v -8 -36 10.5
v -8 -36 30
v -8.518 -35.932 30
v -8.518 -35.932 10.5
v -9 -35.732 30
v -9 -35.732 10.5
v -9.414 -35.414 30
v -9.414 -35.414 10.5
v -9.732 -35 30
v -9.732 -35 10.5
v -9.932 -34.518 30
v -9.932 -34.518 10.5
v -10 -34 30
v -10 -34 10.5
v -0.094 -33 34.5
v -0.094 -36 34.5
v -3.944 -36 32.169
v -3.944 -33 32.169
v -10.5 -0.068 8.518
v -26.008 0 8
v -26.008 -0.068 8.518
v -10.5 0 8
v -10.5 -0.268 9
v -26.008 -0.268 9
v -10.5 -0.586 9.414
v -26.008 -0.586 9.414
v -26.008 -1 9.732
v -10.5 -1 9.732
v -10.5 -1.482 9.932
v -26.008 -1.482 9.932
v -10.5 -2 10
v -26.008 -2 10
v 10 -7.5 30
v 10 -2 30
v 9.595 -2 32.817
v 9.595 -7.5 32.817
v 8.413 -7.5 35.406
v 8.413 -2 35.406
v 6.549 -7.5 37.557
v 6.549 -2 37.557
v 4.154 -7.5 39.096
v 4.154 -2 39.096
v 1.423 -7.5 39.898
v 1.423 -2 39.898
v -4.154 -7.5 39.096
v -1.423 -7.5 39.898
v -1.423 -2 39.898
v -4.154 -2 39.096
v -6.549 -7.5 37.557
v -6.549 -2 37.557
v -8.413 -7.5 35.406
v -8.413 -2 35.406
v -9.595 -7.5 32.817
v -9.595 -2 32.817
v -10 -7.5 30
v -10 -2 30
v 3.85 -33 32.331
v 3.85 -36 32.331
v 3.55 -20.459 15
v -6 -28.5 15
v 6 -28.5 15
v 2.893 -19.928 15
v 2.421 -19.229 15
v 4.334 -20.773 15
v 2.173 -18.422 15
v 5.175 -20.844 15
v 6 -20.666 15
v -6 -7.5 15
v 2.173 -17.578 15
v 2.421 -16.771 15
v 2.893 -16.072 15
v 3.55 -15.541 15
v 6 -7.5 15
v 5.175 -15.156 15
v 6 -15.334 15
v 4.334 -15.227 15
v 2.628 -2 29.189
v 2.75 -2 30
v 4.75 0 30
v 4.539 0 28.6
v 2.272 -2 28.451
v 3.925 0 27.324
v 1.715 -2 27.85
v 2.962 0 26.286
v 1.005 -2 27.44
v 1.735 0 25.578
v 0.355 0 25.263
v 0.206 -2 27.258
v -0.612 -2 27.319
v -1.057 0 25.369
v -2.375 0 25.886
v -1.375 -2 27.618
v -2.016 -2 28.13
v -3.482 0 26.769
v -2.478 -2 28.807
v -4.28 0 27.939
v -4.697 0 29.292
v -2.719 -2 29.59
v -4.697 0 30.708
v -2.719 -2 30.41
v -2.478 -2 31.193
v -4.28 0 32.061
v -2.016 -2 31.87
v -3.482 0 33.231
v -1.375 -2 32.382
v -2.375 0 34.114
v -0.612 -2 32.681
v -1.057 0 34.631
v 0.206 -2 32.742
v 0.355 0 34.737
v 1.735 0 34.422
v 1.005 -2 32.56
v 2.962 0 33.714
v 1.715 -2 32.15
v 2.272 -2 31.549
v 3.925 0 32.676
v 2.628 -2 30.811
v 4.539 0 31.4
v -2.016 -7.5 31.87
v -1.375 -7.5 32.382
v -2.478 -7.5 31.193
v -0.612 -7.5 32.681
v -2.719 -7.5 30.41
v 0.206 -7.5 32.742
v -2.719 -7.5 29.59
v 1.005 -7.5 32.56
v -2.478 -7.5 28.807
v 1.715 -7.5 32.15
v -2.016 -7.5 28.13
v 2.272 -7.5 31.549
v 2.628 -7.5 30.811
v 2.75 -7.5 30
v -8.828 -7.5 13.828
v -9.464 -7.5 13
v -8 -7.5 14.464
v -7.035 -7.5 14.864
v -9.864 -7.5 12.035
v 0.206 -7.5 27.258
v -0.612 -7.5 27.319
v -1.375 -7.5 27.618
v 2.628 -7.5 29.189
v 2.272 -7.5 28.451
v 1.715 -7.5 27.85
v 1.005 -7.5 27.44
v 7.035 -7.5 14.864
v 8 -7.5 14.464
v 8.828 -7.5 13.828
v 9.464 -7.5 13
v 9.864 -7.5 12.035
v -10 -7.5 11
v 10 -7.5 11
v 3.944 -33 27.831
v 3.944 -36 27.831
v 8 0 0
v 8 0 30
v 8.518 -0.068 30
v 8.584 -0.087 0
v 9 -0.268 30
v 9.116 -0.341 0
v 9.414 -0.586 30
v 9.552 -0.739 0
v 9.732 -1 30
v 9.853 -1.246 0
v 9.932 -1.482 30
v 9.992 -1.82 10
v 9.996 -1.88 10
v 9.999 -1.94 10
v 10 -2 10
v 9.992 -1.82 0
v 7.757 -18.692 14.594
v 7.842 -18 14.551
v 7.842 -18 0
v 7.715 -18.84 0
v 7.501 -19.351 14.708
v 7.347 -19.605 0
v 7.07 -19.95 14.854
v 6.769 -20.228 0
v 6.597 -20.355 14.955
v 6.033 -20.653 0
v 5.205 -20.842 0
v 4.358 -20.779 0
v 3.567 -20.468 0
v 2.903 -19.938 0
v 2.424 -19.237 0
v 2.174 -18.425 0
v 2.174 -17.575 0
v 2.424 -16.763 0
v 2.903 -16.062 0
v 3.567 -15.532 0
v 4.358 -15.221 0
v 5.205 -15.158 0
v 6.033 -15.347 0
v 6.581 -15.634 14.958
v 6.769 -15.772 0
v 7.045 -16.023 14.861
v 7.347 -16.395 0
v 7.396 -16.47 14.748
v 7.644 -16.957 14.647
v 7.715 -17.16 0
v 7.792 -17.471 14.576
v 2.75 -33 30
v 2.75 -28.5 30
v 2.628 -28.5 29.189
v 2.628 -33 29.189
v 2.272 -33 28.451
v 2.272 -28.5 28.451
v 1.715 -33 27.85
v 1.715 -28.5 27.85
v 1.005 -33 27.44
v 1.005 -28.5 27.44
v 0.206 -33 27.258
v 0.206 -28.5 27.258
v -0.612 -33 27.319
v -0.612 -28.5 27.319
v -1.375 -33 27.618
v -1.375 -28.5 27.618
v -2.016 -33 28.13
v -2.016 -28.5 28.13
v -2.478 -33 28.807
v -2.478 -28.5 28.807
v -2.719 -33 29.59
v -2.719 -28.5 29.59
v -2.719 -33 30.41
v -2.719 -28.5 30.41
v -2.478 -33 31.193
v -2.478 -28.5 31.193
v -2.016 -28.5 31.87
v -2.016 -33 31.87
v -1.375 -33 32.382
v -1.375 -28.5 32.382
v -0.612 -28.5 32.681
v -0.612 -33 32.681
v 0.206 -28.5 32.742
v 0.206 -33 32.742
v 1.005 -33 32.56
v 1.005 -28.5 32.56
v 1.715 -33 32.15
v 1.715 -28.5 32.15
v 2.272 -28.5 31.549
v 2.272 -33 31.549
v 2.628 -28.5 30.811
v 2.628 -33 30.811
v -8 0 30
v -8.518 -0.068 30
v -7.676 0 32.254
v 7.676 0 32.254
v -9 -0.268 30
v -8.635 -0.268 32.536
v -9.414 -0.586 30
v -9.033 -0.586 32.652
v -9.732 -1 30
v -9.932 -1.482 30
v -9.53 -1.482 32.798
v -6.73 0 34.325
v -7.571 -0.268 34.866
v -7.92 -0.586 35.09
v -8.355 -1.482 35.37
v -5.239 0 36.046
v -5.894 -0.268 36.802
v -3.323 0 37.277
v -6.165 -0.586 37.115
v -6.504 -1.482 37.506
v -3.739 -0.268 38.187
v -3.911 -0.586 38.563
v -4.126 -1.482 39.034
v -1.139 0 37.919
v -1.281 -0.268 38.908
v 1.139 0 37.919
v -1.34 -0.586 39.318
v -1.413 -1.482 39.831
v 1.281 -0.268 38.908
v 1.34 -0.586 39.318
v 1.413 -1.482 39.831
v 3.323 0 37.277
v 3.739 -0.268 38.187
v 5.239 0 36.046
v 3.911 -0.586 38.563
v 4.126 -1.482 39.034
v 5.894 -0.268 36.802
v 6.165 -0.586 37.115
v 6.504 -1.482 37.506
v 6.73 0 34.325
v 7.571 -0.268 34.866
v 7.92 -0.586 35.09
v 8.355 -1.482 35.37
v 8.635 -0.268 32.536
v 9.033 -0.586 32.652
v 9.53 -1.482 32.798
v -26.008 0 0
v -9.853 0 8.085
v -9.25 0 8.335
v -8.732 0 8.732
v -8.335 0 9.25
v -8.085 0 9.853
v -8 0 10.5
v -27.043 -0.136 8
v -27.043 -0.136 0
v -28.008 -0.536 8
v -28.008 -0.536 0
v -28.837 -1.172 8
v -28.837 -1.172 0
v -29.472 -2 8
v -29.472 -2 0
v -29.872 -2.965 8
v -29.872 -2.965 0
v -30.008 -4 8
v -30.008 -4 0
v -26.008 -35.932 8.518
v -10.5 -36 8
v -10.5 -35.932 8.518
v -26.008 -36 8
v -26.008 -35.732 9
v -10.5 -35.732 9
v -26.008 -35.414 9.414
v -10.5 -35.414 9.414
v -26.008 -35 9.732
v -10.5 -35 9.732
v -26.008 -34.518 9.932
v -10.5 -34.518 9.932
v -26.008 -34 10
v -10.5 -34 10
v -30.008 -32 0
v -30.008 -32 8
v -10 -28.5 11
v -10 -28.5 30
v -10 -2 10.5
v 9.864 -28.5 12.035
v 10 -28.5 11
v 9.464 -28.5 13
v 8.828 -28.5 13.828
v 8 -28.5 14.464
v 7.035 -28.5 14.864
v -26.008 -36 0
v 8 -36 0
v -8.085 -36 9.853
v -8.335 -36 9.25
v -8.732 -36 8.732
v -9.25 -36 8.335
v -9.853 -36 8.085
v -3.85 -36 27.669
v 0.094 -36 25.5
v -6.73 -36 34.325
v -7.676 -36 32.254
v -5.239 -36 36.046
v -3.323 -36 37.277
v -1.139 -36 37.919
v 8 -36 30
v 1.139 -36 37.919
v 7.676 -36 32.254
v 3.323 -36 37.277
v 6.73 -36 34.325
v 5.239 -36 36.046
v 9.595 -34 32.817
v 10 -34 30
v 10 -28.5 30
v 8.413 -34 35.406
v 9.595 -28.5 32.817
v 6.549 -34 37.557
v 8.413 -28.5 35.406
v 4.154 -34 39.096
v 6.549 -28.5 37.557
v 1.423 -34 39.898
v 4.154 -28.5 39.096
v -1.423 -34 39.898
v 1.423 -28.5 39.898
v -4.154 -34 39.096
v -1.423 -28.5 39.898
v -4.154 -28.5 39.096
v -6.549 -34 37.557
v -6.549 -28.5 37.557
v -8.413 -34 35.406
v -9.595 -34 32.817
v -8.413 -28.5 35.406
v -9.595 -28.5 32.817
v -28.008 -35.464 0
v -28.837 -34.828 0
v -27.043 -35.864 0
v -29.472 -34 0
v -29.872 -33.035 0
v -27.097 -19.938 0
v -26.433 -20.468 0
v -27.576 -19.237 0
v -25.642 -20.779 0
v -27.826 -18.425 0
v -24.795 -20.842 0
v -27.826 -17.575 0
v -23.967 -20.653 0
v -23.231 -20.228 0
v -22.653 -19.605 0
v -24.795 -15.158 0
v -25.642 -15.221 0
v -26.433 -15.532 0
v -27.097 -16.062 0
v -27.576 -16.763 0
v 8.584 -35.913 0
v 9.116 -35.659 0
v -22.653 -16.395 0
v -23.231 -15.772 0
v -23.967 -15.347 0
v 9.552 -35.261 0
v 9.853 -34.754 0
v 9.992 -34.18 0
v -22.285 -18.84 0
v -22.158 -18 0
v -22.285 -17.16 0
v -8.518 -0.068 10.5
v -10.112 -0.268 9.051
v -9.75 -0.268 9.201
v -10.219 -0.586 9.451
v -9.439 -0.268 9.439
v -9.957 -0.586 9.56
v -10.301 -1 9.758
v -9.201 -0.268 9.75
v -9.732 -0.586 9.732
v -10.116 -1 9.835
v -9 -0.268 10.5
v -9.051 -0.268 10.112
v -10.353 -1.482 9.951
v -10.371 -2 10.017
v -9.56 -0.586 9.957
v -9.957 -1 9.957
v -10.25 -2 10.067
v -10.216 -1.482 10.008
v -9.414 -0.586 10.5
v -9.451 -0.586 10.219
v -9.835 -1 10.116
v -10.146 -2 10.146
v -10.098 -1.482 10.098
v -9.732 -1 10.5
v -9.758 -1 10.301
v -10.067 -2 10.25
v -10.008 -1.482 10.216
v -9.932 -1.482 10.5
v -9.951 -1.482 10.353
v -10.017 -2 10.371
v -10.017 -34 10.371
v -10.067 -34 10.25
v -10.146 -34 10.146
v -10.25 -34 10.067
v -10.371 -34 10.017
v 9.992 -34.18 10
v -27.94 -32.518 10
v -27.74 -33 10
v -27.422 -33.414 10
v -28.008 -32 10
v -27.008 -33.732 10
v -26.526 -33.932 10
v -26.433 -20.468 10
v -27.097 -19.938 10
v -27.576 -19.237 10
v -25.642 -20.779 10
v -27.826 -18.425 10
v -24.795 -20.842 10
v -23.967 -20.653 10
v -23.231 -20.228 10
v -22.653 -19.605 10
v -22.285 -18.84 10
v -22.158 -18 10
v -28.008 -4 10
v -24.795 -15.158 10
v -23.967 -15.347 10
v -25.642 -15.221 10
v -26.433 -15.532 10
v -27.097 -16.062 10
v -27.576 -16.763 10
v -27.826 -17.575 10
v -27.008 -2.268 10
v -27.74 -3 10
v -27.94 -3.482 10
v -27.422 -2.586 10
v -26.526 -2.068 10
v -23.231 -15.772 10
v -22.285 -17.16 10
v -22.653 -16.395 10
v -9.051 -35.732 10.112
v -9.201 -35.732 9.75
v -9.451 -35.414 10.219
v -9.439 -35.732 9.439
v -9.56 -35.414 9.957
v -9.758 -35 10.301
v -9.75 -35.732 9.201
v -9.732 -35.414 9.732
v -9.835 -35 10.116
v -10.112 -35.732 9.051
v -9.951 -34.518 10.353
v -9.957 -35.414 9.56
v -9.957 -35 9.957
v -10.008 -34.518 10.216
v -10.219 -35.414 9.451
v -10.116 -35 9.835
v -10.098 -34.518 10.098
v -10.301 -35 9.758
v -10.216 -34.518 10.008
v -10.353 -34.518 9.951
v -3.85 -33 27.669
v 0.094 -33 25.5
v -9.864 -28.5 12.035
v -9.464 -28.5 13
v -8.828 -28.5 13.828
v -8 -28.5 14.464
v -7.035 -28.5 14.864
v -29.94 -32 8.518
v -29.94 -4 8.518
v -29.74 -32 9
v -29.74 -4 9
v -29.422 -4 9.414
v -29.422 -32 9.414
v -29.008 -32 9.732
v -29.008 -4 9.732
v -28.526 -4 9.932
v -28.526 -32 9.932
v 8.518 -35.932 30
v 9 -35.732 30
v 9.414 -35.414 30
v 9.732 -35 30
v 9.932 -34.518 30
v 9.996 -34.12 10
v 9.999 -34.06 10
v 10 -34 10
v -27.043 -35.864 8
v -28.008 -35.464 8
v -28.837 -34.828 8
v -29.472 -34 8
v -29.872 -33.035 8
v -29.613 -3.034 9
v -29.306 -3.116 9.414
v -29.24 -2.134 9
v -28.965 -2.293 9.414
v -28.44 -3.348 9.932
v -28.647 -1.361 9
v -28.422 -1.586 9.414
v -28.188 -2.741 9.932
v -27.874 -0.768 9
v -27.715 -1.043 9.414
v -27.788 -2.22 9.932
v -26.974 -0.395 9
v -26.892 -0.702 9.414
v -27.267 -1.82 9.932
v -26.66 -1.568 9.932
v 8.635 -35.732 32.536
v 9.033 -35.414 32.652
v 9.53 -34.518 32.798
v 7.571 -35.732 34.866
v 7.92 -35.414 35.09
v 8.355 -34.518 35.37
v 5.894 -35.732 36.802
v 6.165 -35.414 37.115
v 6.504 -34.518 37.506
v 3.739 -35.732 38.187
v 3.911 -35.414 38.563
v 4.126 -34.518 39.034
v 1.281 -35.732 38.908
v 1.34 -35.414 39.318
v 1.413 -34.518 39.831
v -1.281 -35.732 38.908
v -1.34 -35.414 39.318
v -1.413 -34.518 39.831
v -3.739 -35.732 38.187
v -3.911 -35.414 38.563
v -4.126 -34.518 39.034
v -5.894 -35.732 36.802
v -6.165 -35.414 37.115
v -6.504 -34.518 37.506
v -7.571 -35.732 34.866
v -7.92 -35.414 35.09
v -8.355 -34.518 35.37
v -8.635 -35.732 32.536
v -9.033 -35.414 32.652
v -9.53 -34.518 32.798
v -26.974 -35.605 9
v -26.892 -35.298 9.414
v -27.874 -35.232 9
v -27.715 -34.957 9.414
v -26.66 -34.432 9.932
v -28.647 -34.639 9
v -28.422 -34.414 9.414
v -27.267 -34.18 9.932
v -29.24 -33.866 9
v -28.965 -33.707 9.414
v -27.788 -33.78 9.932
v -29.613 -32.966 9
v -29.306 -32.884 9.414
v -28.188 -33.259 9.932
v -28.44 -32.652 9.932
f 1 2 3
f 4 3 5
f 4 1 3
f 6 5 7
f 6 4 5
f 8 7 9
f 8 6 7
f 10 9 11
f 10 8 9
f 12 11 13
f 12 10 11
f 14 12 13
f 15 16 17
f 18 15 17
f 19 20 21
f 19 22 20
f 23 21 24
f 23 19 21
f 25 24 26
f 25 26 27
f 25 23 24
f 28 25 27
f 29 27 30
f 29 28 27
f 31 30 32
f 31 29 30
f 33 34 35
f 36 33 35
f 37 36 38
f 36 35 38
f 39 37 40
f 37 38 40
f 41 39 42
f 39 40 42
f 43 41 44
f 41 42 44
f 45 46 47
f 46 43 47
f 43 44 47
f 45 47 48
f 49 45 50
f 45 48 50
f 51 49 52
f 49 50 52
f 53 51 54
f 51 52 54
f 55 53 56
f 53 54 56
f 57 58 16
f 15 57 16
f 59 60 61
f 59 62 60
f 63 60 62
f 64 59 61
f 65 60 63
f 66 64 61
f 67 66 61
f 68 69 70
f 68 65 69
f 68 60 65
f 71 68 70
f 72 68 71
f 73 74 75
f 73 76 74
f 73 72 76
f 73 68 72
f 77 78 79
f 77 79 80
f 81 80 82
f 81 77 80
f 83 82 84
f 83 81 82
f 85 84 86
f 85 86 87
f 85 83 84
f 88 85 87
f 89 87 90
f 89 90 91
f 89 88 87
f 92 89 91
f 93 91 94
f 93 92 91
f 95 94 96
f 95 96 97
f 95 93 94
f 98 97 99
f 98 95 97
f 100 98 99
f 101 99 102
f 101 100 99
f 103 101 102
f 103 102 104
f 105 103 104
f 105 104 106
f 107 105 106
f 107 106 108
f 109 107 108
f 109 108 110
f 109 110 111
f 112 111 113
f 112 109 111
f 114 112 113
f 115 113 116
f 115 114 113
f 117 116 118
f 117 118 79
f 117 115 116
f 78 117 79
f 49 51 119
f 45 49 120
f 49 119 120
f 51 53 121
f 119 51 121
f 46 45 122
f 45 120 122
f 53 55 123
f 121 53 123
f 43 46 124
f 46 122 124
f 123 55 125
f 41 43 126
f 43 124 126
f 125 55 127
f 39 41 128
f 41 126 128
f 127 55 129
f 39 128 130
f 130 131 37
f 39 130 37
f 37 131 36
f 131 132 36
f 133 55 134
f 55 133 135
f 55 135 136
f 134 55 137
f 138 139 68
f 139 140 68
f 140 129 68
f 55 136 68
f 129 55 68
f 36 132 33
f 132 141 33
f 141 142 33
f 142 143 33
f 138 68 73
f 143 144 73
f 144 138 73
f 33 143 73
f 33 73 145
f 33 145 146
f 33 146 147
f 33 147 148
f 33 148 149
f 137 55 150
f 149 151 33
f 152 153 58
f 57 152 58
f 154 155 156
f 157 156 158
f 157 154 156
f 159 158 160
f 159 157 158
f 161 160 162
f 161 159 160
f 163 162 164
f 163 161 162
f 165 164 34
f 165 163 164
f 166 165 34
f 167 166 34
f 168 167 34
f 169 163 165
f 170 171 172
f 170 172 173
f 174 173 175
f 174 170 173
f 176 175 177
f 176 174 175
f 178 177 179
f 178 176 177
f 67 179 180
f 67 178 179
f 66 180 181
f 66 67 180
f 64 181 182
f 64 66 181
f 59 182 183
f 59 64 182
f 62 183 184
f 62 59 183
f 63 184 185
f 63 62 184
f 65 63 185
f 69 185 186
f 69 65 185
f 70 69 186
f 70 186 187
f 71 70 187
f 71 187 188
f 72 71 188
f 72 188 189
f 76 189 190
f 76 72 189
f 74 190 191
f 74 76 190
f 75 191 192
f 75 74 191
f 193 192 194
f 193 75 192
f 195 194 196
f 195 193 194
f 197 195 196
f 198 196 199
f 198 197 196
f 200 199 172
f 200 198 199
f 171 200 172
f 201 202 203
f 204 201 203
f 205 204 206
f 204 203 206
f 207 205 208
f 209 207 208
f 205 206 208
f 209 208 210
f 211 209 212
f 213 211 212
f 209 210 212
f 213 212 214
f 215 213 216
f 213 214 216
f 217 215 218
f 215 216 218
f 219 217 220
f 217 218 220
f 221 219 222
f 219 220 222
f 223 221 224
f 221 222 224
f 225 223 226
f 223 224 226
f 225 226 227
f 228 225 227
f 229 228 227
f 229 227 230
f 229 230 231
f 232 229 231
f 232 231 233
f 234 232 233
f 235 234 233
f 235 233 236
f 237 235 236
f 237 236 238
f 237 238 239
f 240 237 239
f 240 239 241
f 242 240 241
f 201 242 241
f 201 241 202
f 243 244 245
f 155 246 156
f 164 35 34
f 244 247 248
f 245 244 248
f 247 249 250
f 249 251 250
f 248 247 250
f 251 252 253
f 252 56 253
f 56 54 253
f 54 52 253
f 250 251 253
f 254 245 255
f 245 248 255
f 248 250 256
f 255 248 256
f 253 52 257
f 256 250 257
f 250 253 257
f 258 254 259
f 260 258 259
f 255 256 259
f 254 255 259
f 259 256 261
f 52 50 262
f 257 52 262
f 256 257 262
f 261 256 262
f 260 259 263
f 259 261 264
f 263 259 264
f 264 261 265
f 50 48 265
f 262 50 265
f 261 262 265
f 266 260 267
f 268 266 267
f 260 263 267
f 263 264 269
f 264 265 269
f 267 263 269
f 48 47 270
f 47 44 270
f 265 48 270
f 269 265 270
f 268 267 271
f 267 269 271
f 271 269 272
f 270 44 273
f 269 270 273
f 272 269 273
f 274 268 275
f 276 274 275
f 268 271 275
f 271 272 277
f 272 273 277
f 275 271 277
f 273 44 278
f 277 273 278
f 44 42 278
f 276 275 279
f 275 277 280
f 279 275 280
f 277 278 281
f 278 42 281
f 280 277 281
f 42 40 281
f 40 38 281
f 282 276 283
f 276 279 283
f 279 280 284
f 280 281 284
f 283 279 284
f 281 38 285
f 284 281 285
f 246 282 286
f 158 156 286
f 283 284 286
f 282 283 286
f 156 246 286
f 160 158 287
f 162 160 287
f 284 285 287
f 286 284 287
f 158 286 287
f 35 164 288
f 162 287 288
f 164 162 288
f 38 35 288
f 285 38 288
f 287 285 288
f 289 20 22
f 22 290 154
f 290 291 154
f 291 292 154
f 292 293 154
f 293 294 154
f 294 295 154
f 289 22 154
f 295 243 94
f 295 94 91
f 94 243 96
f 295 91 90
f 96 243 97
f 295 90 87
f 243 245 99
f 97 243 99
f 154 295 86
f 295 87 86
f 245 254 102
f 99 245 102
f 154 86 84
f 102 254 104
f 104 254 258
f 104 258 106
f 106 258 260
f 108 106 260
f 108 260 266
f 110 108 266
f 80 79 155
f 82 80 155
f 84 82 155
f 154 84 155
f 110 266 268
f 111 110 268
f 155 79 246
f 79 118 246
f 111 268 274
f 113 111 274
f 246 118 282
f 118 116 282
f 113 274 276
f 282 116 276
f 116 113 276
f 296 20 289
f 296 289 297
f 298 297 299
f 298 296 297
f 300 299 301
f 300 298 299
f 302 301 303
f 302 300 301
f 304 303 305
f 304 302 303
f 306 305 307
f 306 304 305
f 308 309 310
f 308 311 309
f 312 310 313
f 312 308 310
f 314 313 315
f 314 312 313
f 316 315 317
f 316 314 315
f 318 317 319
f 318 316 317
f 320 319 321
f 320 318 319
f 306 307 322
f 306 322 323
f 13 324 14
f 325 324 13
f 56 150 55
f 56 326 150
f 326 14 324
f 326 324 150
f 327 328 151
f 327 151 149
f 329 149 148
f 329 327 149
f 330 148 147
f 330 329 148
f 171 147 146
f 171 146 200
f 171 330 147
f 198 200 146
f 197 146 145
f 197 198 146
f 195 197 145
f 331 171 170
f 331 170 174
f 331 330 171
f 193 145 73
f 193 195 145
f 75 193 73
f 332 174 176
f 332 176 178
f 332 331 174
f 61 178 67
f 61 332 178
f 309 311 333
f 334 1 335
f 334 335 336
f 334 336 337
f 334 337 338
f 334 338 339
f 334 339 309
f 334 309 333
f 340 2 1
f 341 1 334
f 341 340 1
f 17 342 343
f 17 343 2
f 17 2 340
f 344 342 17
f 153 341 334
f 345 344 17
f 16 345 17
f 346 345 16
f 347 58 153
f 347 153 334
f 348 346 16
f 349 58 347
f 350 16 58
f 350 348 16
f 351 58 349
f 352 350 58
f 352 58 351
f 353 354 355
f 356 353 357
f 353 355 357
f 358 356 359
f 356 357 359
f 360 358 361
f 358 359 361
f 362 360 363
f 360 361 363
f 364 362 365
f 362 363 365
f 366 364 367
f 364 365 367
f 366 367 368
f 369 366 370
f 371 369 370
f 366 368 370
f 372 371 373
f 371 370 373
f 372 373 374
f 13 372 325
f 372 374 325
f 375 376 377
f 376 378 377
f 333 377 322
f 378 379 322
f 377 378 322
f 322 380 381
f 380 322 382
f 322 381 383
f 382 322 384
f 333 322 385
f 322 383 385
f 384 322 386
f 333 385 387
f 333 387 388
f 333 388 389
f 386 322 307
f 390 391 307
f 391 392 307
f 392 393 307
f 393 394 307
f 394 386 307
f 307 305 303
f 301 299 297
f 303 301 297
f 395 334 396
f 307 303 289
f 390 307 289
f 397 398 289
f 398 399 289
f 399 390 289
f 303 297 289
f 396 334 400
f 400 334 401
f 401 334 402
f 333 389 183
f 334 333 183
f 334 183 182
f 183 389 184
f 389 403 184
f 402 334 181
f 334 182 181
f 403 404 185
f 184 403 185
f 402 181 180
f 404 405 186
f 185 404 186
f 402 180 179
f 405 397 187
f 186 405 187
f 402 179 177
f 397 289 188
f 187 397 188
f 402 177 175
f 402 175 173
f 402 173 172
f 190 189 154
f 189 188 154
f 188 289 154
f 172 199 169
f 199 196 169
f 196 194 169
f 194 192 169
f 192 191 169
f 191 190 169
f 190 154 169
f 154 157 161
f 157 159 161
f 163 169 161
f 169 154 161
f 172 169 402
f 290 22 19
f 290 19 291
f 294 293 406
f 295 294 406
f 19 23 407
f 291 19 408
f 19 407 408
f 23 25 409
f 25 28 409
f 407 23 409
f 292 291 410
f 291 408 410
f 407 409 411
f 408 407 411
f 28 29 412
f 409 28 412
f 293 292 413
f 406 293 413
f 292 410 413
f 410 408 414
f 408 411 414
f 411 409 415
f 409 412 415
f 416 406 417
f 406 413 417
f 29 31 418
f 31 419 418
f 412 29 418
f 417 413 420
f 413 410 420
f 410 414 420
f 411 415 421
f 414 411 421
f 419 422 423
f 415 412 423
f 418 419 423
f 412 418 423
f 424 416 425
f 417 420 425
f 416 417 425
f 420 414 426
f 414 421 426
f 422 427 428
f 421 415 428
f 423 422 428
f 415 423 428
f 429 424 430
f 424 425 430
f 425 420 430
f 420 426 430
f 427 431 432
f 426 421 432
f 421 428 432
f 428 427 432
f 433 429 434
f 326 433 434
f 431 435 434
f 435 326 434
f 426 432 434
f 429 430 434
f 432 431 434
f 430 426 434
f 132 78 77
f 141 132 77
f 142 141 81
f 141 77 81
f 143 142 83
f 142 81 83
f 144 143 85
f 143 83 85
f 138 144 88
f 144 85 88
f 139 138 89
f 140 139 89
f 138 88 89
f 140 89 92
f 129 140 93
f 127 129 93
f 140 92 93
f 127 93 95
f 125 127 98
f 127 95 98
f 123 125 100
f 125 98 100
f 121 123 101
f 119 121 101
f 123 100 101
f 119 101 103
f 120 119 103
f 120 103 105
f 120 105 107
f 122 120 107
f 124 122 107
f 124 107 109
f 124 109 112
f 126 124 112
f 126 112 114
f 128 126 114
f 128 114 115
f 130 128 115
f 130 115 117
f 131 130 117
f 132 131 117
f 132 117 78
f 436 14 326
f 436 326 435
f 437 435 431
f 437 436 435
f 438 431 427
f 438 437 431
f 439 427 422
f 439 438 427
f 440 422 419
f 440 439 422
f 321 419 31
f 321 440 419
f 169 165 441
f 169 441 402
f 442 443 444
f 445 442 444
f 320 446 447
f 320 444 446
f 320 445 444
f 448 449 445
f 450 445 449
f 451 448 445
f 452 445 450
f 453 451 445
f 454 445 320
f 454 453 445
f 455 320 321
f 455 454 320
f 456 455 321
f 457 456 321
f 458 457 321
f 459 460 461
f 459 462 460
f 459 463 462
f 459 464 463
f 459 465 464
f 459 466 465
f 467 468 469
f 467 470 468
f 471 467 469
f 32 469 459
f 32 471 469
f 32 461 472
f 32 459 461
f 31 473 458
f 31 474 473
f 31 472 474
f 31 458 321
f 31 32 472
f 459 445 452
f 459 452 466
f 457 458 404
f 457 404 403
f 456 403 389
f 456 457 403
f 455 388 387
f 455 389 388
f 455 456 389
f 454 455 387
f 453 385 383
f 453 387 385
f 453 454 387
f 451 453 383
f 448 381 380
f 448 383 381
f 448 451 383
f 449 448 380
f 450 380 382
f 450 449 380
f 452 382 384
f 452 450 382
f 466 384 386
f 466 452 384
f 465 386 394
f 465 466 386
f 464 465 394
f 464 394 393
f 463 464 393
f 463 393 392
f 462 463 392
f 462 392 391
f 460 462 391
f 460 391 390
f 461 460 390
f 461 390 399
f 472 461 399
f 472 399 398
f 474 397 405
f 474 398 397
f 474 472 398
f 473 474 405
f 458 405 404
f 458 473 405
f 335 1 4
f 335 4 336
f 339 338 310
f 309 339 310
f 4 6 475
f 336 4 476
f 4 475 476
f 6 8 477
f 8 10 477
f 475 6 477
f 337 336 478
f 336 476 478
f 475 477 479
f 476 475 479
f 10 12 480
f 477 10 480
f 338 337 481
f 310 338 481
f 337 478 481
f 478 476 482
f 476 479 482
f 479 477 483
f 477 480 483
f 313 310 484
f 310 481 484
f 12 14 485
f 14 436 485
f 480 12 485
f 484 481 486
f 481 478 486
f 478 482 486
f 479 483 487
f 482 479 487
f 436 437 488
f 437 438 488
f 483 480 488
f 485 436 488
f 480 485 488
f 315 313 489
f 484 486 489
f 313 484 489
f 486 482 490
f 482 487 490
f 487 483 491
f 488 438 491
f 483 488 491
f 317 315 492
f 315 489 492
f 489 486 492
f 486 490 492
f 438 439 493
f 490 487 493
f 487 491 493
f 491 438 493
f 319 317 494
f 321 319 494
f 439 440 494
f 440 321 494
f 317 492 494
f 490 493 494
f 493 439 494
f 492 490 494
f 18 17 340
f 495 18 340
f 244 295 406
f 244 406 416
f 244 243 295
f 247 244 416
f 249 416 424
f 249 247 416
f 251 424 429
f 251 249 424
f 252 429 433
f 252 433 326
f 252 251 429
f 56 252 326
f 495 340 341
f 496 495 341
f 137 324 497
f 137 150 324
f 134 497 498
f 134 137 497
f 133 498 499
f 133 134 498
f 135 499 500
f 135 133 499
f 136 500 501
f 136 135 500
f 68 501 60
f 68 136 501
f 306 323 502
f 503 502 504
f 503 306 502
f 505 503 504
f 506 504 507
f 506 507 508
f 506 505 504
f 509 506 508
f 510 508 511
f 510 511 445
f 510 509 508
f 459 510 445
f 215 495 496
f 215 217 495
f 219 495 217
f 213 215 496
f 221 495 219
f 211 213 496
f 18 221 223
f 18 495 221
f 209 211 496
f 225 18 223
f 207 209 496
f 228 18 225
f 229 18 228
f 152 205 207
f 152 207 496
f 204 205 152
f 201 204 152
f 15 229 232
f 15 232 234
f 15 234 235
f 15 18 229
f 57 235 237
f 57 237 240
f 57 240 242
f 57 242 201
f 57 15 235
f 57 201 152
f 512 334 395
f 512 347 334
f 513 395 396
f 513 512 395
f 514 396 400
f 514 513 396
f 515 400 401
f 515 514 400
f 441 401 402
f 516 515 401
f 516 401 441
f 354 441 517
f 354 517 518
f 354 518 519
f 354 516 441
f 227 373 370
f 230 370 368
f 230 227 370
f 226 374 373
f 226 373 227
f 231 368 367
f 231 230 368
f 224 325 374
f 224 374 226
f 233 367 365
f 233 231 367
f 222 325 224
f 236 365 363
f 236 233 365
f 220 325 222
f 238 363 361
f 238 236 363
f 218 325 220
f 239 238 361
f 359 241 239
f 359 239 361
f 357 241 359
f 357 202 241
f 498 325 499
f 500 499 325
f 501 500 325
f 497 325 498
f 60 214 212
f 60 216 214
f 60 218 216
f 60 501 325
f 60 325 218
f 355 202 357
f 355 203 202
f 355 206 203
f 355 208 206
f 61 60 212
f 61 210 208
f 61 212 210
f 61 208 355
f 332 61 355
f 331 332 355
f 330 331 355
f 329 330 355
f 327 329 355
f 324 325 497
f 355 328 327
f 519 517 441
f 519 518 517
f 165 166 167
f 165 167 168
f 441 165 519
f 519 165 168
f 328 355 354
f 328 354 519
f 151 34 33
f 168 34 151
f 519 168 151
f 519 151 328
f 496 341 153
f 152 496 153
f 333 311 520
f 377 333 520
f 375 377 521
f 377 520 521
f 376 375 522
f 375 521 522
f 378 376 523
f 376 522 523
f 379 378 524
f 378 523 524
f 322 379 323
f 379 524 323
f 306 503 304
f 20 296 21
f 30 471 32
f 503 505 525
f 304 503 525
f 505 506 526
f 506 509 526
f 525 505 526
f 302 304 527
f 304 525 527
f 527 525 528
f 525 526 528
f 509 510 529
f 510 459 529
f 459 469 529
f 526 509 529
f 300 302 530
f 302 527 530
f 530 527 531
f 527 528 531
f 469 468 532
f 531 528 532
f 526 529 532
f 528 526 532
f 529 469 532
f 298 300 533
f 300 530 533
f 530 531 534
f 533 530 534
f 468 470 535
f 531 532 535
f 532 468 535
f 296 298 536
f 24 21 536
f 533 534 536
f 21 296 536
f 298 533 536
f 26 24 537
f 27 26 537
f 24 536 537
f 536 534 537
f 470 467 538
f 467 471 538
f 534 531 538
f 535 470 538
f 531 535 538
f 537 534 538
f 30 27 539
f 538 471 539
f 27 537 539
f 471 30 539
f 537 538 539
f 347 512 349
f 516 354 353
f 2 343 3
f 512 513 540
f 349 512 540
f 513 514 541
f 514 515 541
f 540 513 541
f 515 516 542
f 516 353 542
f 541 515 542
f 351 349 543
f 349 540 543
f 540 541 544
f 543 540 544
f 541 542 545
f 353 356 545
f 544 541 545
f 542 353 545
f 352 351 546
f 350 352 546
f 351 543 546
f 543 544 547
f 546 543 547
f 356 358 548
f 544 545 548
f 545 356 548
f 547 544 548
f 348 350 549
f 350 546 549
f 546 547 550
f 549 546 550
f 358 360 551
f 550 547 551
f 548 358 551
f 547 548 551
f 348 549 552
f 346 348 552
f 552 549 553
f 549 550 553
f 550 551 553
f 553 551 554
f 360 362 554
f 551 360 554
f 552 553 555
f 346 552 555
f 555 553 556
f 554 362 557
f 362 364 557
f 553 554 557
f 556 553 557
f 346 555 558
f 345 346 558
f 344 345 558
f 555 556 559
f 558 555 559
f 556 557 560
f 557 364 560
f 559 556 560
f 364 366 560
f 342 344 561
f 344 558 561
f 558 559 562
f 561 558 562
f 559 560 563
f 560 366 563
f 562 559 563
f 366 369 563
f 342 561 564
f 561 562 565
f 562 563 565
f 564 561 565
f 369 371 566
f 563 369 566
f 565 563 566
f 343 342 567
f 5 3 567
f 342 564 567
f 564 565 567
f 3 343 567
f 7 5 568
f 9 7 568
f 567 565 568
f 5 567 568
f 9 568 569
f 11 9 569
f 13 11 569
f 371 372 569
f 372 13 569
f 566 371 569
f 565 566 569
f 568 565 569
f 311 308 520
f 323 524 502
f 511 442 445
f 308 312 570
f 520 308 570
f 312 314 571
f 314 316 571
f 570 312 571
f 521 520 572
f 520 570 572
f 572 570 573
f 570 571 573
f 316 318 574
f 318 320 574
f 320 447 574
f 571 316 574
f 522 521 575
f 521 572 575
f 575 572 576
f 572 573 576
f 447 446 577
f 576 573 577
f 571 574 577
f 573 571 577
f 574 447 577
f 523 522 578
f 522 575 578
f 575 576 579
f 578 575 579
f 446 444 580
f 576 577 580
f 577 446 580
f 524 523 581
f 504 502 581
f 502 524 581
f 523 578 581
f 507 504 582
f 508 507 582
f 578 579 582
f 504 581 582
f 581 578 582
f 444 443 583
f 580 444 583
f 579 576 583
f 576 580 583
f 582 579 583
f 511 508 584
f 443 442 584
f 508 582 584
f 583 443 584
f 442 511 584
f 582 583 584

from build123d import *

# Parameters (mm, degrees)
PAD_DEPTH       = 36
SKETCH001_W     = 41.77589
SKETCH001_H     = 47.890068
POCKET_DEPTH    = 10.5
SKETCH002_R     = 2.75
POCKET001_DEPTH = 36.001
FILLET_R        = 4
FILLET001_R     = 0.5
SKETCH003_R     = 2.85
HOLE_DEPTH      = 16.001
FILLET002_R     = 4
CHAMFER_SIZE    = 2
POCKET002_DEPTH = 3
FILLET003_R     = 2


with BuildPart() as part:
    # Sketch → Pad (new body)
    with BuildSketch(Plane.XZ):
        with BuildLine():
            Line((-30.008135, 0), (9.991865, 0))
            Line((9.991865, 10), (9.991865, 0))
            Line((10, 10), (9.991865, 10))
            Line((10, 30), (10, 10))
            ThreePointArc((10, 30), (0, 40), (-10, 30))
            Line((-10, 10), (-10, 30))
            Line((-30.008135, 10), (-10, 10))
            Line((-30.008135, 0), (-30.008135, 10))
        make_face()
    extrude(amount=PAD_DEPTH)

    # Sketch001 (on DatumPlane) → Pocket (cut, symmetric)
    with BuildSketch(Plane(origin=(0, -18, 0), x_dir=(1, 0, 0), z_dir=(0, 1, 0))):
        with Locations((0.131337, -38.945034)):
            Rectangle(SKETCH001_W, SKETCH001_H)
    extrude(amount=POCKET_DEPTH, both=True, mode=Mode.SUBTRACT)

    # Sketch002 (on Face4 of Pocket) → Pocket001 (cut, through all)
    with BuildSketch(Plane(origin=(0, 0, 0), x_dir=(1, 0, 0), z_dir=(0, 1, 0))):
        with Locations((0, -30)):
            Circle(SKETCH002_R)
    extrude(amount=-POCKET001_DEPTH, mode=Mode.SUBTRACT)

    # Fillet
    fillet_edges = [part.edges().sort_by_distance(p)[0] for p in [
        (10, -18, 15),
        (-10, -18, 15),
    ]]
    fillet(fillet_edges, radius=FILLET_R)

    # Fillet001
    fillet001_edges = [part.edges().sort_by_distance(p)[0] for p in [
        (-10, -18, 10),
    ]]
    fillet(fillet001_edges, radius=FILLET001_R)

    # Sketch003 (on DatumPlane) → Hole (cut, through all)
    with BuildSketch(Plane(origin=(0, 0, 16), x_dir=(1, 0, 0), z_dir=(0, 0, -1))):
        with Locations((4.991865, 18)):
            Circle(SKETCH003_R)
        with Locations((-25.008135, 18)):
            Circle(SKETCH003_R)
    extrude(amount=HOLE_DEPTH, mode=Mode.SUBTRACT)

    # Fillet002
    fillet002_edges = [part.edges().sort_by_distance(p)[0] for p in [
        (-30.008135, 0, 5),
        (-30.008135, -36, 5),
    ]]
    fillet(fillet002_edges, radius=FILLET002_R)

    # Chamfer
    chamfer_edges = [part.edges().sort_by_distance(p)[0] for p in [
        (-2.75, 0, 30),
    ]]
    chamfer(chamfer_edges, length=CHAMFER_SIZE)

    # Sketch004 (on Face14 of Chamfer) → Pocket002 (cut)
    with BuildSketch(Plane.XZ.offset(36)):
        Polygon((-0.093793, 34.5), (-3.944011, 32.168773), (-3.850218, 27.668773), (0.093793, 25.5), (3.944011, 27.831227), (3.850218, 32.331227), align=None)
    extrude(amount=-POCKET002_DEPTH, mode=Mode.SUBTRACT)

    # Fillet003
    fillet003_edges = [part.edges().sort_by_distance(p)[0] for p in [
        (10, 0, 20),
        (10, -36, 20),
    ]]
    fillet(fillet003_edges, radius=FILLET003_R)


solid = part.part
